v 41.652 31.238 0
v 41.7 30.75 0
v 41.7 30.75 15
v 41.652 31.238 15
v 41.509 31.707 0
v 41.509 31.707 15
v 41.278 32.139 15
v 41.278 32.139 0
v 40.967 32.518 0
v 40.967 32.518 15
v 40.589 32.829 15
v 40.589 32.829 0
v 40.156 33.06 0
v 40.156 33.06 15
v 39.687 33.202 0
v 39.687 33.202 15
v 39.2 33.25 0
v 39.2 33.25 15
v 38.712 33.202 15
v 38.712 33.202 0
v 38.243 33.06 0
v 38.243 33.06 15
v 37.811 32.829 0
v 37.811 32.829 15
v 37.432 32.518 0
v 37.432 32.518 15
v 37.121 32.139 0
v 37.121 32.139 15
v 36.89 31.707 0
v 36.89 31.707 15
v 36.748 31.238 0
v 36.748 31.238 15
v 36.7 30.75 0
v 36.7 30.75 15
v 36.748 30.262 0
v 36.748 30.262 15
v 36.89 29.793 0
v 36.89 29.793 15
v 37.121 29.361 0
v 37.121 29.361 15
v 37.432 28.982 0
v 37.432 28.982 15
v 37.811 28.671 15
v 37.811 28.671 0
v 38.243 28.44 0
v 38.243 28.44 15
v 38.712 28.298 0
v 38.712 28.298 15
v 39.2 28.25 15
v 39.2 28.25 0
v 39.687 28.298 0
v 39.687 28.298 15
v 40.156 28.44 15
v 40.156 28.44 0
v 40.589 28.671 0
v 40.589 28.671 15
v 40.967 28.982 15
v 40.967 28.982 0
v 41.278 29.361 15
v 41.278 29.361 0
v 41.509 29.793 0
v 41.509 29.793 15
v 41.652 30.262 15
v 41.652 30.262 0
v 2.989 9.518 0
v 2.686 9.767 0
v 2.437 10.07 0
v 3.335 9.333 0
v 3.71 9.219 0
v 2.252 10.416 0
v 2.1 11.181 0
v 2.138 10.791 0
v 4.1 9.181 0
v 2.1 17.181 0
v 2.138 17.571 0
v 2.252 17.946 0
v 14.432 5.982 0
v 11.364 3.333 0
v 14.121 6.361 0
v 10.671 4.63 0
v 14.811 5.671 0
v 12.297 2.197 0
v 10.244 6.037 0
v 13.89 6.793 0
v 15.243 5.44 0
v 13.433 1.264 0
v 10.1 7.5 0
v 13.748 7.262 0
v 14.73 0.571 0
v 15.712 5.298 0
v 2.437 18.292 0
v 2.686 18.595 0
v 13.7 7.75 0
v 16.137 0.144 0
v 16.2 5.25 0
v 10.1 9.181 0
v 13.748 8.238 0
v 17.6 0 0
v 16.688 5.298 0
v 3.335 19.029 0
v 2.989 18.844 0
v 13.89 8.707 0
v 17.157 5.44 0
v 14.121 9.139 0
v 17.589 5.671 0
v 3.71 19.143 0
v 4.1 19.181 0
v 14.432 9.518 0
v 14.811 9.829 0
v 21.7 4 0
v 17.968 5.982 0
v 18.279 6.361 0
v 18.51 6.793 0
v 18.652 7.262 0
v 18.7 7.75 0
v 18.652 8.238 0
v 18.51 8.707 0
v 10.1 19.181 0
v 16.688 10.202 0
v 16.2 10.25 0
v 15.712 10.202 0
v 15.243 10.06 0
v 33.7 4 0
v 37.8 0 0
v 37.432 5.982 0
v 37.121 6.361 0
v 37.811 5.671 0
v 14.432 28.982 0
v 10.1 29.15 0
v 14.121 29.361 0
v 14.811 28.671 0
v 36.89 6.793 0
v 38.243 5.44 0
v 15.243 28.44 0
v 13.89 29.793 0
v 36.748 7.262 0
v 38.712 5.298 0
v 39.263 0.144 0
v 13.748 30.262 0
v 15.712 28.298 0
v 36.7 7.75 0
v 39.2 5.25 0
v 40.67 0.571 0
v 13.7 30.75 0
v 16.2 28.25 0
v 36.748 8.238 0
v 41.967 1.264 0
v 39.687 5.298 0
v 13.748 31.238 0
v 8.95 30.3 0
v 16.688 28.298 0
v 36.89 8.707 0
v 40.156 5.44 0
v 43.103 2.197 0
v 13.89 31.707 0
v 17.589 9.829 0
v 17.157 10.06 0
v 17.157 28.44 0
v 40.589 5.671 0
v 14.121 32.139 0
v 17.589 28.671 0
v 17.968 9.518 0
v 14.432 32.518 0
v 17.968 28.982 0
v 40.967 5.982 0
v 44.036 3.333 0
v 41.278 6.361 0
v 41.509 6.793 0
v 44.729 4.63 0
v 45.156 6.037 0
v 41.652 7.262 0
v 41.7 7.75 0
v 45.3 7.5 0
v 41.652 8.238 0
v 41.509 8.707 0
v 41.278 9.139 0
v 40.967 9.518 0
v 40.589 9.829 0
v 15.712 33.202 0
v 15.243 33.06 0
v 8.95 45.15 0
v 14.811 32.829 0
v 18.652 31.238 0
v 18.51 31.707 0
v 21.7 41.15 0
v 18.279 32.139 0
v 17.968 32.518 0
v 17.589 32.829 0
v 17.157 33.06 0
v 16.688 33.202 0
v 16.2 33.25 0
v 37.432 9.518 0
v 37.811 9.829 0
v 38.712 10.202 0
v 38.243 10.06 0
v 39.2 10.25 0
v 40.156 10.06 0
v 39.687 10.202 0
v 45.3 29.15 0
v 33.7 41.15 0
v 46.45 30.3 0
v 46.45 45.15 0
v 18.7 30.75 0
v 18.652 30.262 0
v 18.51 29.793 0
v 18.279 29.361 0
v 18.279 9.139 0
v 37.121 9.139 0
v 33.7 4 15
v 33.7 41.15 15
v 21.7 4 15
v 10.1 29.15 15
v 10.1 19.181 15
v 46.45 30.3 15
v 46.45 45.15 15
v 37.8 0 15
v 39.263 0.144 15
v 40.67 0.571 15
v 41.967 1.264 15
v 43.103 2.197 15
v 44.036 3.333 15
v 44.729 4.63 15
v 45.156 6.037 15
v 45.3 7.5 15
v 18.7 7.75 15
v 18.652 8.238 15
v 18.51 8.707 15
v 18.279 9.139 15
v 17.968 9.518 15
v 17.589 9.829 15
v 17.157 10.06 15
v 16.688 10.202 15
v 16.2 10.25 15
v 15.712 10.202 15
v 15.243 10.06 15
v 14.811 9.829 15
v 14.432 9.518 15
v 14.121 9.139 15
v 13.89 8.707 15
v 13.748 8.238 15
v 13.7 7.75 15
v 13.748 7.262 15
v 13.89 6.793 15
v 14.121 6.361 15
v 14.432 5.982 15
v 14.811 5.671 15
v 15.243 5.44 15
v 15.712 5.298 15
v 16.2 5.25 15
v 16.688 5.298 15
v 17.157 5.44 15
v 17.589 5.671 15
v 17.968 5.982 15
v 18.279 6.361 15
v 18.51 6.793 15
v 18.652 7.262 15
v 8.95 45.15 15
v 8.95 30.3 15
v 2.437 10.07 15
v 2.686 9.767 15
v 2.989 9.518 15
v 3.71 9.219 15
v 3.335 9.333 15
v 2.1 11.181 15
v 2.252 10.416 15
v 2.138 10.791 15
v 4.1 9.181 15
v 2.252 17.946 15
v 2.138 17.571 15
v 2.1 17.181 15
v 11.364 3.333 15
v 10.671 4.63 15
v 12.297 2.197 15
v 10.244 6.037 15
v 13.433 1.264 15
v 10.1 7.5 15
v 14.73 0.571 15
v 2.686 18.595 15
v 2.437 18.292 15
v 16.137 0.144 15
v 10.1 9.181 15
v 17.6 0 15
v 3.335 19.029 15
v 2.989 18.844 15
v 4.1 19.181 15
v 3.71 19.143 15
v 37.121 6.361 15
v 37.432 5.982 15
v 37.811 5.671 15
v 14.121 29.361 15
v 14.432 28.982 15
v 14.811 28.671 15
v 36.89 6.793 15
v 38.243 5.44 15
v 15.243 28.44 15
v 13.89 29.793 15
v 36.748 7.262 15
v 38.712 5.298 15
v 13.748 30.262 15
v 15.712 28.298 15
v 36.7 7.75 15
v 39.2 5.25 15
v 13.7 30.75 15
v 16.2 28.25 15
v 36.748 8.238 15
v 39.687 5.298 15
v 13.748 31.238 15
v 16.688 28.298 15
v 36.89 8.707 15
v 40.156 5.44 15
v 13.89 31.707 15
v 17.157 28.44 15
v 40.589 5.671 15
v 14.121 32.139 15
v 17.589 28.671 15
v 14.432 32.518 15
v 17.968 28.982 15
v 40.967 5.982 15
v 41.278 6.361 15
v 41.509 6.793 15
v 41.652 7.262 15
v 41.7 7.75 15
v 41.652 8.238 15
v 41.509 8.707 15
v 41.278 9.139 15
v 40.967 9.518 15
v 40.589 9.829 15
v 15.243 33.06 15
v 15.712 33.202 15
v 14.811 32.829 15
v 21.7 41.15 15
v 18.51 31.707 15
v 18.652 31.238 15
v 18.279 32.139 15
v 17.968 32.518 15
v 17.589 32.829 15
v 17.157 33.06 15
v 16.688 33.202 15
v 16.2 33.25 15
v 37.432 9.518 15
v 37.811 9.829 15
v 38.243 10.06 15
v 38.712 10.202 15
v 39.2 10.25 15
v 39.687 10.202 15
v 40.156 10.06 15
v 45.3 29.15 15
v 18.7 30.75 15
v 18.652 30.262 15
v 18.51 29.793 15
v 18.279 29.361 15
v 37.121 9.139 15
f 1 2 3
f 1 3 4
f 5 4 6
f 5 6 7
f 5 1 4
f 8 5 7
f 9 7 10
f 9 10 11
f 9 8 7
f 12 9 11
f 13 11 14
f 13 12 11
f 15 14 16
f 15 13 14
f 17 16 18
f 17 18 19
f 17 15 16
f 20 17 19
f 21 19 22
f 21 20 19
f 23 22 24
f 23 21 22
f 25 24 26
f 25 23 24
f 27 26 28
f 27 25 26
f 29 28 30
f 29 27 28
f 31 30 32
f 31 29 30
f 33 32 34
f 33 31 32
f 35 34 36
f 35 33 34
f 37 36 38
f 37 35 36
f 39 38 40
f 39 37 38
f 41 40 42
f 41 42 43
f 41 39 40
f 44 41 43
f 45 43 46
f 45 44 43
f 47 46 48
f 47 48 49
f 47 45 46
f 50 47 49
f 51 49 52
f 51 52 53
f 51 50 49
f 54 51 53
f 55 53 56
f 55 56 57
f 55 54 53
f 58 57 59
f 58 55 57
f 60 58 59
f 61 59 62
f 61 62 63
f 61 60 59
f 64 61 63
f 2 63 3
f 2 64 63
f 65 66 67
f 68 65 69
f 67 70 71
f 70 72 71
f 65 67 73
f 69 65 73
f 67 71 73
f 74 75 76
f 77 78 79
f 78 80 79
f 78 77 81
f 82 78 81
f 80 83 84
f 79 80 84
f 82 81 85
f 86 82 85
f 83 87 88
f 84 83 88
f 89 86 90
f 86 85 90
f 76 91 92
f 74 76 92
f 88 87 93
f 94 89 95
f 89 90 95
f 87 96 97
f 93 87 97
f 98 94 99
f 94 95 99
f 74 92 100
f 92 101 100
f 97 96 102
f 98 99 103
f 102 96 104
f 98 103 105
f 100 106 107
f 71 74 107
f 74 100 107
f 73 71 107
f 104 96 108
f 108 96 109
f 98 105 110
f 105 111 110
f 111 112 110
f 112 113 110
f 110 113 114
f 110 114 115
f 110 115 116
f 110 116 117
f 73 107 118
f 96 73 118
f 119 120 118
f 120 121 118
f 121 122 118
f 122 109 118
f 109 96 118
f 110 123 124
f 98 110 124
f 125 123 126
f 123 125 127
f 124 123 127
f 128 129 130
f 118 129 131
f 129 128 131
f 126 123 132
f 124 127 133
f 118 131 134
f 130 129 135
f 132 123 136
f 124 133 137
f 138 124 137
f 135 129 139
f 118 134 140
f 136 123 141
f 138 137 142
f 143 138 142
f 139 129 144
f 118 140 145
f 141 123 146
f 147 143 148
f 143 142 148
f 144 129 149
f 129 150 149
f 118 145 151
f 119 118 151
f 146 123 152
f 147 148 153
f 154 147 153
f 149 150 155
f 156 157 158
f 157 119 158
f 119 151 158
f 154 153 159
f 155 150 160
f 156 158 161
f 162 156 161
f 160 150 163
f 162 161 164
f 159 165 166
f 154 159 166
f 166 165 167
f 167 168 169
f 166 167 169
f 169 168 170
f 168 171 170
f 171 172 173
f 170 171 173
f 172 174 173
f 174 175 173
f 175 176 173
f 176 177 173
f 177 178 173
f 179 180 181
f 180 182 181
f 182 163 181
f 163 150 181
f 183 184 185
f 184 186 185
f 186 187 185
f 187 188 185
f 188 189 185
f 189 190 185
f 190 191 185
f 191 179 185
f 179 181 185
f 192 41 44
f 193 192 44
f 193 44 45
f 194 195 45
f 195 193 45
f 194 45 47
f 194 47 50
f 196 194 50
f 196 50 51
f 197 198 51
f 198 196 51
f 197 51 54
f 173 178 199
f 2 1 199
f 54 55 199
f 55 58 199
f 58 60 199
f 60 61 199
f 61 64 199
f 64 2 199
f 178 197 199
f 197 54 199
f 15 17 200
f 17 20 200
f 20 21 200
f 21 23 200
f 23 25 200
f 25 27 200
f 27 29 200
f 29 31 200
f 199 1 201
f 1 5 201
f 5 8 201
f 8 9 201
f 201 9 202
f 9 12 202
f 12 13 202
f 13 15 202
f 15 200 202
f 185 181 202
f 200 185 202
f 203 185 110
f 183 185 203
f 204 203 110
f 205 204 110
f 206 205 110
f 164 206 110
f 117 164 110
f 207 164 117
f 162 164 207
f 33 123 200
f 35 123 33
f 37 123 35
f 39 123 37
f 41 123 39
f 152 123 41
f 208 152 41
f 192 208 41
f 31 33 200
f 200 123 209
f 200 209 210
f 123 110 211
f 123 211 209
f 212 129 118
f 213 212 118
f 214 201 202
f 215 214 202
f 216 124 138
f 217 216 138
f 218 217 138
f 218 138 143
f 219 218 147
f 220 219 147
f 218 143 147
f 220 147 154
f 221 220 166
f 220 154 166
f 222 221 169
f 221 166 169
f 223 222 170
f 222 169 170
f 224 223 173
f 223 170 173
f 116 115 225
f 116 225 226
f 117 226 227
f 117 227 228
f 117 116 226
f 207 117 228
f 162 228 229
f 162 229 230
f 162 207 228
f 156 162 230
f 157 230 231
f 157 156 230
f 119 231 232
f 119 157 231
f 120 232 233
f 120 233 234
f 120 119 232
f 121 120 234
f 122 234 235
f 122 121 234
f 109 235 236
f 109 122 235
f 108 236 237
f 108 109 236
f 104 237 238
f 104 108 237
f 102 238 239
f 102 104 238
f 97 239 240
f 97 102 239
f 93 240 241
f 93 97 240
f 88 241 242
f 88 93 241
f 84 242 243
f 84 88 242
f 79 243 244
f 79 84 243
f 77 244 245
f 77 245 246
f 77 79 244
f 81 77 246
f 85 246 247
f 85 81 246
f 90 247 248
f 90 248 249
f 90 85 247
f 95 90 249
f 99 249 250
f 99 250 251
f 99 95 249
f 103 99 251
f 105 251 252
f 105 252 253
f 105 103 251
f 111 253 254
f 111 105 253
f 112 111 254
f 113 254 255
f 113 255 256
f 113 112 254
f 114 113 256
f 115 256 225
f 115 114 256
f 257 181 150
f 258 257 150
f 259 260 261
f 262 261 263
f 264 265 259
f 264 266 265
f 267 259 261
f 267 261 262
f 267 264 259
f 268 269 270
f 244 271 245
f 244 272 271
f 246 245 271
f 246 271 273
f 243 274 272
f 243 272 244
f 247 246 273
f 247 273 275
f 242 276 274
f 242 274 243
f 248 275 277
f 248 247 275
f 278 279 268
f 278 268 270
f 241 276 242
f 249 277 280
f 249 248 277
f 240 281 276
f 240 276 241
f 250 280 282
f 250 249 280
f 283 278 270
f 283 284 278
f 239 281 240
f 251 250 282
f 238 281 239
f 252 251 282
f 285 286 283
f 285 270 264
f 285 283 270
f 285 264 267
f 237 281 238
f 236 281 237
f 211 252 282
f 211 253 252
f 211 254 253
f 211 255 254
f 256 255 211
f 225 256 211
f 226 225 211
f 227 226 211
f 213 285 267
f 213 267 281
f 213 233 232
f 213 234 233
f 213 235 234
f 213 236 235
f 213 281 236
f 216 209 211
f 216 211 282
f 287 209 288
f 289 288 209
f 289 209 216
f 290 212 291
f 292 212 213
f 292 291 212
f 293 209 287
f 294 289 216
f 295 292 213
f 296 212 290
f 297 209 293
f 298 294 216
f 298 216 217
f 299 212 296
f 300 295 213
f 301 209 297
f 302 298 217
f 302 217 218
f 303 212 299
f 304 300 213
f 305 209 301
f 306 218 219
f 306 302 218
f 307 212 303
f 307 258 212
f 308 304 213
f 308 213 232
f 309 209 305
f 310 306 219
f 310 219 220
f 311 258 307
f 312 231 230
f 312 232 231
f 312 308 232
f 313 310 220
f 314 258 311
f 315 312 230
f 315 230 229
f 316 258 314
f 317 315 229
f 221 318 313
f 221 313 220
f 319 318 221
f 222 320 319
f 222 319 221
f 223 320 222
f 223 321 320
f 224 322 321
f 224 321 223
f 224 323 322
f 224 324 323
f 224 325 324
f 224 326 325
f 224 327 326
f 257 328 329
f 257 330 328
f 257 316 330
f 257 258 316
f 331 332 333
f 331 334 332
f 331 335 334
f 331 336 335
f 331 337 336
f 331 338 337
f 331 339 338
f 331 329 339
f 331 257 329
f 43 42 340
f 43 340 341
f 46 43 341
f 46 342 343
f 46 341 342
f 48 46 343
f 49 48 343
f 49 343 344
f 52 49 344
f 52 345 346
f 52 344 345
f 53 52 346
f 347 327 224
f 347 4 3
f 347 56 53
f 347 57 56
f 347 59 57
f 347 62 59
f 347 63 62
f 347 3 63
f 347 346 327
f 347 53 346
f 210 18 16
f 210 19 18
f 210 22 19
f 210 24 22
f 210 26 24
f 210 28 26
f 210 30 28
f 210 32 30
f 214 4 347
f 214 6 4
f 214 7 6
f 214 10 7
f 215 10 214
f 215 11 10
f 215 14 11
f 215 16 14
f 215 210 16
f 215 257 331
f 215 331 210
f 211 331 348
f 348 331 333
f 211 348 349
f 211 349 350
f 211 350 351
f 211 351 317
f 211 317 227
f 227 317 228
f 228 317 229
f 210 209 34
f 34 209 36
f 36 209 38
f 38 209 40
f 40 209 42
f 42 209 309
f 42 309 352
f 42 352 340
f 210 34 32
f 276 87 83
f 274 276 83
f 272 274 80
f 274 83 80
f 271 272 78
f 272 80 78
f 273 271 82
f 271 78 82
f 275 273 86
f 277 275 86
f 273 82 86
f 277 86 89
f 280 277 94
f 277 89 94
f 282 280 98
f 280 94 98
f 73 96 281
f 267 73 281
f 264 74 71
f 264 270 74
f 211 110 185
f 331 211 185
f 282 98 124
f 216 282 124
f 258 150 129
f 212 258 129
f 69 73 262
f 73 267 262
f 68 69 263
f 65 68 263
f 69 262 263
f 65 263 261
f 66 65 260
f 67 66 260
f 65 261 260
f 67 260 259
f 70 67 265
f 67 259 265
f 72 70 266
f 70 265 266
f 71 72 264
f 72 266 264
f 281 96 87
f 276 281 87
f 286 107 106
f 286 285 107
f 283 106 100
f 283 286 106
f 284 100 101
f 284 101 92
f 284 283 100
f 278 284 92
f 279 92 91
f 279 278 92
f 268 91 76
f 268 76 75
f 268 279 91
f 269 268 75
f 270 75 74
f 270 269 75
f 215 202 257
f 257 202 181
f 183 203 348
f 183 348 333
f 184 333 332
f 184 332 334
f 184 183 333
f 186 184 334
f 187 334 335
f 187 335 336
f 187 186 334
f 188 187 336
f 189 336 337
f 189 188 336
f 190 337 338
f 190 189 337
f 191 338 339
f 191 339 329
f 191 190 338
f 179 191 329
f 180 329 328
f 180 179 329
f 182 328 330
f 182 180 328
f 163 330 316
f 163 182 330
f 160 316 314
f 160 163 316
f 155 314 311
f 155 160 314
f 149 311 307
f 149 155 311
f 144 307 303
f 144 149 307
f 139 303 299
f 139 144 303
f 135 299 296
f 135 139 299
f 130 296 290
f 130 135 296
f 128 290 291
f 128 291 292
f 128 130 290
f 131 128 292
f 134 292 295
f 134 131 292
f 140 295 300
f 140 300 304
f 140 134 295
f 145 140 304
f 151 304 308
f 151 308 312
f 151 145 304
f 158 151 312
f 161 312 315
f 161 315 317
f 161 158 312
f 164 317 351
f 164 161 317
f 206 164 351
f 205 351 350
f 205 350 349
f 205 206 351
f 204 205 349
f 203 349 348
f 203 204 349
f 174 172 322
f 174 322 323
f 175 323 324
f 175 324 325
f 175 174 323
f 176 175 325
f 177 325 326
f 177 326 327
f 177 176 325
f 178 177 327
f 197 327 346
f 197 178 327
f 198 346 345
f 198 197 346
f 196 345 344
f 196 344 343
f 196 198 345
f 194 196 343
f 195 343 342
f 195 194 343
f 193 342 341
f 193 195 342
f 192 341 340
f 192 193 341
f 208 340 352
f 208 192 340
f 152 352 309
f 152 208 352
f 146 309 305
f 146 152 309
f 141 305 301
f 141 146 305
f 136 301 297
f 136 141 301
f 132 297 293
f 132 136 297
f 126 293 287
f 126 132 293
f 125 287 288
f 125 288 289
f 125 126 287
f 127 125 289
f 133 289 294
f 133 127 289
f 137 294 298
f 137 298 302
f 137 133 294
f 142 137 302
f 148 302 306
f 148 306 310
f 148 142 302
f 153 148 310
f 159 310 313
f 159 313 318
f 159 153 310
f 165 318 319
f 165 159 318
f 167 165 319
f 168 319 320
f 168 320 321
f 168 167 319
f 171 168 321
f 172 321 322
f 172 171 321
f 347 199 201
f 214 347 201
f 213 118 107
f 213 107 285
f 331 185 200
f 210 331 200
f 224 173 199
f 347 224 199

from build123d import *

# Parameters (mm, degrees)
F0_R     = 2.499999
F0_W     = 12
F0_H     = 37.150002
F1_DEPTH = 15
F2_W     = 10
F2_H     = 15
F3_DEPTH = 8
F4_R     = 2


with BuildPart() as f1:
    # F0 (on Top) → F1 (new body)
    with BuildSketch(Plane.XY):
        with BuildLine():
            Line((46.450001, 45.150002), (8.95, 45.150002))
            Line((8.95, 45.150002), (8.95, 30.300001))
            Line((8.95, 30.300001), (10.099999, 29.150002))
            Line((10.099999, 29.150002), (10.099999, 7.5))
            ThreePointArc((10.099999, 7.5), (12.296699, 2.196699), (17.599999, 0))
            Line((17.599999, 0), (37.799999, 0))
            ThreePointArc((37.799999, 0), (43.1033, 2.196699), (45.299999, 7.5))
            Line((45.299999, 7.5), (45.299999, 29.150002))
            Line((45.299999, 29.150002), (46.450001, 30.300001))
            Line((46.450001, 30.300001), (46.450001, 45.150002))
        make_face()
        with Locations((16.199999, 7.749999)):
            Circle(F0_R, mode=Mode.SUBTRACT)
        with Locations((39.199598, 7.749999)):
            Circle(F0_R, mode=Mode.SUBTRACT)
        with Locations((16.199999, 30.749999)):
            Circle(F0_R, mode=Mode.SUBTRACT)
        with Locations((27.700001, 22.575001)):
            Rectangle(F0_W, F0_H, mode=Mode.SUBTRACT)
        with Locations((39.199598, 30.749999)):
            Circle(F0_R, mode=Mode.SUBTRACT)
    extrude(amount=F1_DEPTH)

    # F2 (on face) → F3 (join)
    with BuildSketch(Plane(origin=(10.099999, 0, 0), x_dir=(0, -1, 0), z_dir=(-1, 0, 0))):
        with Locations((-14.181, 7.5)):
            Rectangle(F2_W, F2_H)
    extrude(amount=F3_DEPTH)

    # F4
    f4_edges = [f1.edges().sort_by_distance(p)[0] for p in [
        (2.099999, 19.181, 7.5),
        (2.099999, 9.181, 7.5),
    ]]
    fillet(f4_edges, radius=F4_R)


solid = f1.part
